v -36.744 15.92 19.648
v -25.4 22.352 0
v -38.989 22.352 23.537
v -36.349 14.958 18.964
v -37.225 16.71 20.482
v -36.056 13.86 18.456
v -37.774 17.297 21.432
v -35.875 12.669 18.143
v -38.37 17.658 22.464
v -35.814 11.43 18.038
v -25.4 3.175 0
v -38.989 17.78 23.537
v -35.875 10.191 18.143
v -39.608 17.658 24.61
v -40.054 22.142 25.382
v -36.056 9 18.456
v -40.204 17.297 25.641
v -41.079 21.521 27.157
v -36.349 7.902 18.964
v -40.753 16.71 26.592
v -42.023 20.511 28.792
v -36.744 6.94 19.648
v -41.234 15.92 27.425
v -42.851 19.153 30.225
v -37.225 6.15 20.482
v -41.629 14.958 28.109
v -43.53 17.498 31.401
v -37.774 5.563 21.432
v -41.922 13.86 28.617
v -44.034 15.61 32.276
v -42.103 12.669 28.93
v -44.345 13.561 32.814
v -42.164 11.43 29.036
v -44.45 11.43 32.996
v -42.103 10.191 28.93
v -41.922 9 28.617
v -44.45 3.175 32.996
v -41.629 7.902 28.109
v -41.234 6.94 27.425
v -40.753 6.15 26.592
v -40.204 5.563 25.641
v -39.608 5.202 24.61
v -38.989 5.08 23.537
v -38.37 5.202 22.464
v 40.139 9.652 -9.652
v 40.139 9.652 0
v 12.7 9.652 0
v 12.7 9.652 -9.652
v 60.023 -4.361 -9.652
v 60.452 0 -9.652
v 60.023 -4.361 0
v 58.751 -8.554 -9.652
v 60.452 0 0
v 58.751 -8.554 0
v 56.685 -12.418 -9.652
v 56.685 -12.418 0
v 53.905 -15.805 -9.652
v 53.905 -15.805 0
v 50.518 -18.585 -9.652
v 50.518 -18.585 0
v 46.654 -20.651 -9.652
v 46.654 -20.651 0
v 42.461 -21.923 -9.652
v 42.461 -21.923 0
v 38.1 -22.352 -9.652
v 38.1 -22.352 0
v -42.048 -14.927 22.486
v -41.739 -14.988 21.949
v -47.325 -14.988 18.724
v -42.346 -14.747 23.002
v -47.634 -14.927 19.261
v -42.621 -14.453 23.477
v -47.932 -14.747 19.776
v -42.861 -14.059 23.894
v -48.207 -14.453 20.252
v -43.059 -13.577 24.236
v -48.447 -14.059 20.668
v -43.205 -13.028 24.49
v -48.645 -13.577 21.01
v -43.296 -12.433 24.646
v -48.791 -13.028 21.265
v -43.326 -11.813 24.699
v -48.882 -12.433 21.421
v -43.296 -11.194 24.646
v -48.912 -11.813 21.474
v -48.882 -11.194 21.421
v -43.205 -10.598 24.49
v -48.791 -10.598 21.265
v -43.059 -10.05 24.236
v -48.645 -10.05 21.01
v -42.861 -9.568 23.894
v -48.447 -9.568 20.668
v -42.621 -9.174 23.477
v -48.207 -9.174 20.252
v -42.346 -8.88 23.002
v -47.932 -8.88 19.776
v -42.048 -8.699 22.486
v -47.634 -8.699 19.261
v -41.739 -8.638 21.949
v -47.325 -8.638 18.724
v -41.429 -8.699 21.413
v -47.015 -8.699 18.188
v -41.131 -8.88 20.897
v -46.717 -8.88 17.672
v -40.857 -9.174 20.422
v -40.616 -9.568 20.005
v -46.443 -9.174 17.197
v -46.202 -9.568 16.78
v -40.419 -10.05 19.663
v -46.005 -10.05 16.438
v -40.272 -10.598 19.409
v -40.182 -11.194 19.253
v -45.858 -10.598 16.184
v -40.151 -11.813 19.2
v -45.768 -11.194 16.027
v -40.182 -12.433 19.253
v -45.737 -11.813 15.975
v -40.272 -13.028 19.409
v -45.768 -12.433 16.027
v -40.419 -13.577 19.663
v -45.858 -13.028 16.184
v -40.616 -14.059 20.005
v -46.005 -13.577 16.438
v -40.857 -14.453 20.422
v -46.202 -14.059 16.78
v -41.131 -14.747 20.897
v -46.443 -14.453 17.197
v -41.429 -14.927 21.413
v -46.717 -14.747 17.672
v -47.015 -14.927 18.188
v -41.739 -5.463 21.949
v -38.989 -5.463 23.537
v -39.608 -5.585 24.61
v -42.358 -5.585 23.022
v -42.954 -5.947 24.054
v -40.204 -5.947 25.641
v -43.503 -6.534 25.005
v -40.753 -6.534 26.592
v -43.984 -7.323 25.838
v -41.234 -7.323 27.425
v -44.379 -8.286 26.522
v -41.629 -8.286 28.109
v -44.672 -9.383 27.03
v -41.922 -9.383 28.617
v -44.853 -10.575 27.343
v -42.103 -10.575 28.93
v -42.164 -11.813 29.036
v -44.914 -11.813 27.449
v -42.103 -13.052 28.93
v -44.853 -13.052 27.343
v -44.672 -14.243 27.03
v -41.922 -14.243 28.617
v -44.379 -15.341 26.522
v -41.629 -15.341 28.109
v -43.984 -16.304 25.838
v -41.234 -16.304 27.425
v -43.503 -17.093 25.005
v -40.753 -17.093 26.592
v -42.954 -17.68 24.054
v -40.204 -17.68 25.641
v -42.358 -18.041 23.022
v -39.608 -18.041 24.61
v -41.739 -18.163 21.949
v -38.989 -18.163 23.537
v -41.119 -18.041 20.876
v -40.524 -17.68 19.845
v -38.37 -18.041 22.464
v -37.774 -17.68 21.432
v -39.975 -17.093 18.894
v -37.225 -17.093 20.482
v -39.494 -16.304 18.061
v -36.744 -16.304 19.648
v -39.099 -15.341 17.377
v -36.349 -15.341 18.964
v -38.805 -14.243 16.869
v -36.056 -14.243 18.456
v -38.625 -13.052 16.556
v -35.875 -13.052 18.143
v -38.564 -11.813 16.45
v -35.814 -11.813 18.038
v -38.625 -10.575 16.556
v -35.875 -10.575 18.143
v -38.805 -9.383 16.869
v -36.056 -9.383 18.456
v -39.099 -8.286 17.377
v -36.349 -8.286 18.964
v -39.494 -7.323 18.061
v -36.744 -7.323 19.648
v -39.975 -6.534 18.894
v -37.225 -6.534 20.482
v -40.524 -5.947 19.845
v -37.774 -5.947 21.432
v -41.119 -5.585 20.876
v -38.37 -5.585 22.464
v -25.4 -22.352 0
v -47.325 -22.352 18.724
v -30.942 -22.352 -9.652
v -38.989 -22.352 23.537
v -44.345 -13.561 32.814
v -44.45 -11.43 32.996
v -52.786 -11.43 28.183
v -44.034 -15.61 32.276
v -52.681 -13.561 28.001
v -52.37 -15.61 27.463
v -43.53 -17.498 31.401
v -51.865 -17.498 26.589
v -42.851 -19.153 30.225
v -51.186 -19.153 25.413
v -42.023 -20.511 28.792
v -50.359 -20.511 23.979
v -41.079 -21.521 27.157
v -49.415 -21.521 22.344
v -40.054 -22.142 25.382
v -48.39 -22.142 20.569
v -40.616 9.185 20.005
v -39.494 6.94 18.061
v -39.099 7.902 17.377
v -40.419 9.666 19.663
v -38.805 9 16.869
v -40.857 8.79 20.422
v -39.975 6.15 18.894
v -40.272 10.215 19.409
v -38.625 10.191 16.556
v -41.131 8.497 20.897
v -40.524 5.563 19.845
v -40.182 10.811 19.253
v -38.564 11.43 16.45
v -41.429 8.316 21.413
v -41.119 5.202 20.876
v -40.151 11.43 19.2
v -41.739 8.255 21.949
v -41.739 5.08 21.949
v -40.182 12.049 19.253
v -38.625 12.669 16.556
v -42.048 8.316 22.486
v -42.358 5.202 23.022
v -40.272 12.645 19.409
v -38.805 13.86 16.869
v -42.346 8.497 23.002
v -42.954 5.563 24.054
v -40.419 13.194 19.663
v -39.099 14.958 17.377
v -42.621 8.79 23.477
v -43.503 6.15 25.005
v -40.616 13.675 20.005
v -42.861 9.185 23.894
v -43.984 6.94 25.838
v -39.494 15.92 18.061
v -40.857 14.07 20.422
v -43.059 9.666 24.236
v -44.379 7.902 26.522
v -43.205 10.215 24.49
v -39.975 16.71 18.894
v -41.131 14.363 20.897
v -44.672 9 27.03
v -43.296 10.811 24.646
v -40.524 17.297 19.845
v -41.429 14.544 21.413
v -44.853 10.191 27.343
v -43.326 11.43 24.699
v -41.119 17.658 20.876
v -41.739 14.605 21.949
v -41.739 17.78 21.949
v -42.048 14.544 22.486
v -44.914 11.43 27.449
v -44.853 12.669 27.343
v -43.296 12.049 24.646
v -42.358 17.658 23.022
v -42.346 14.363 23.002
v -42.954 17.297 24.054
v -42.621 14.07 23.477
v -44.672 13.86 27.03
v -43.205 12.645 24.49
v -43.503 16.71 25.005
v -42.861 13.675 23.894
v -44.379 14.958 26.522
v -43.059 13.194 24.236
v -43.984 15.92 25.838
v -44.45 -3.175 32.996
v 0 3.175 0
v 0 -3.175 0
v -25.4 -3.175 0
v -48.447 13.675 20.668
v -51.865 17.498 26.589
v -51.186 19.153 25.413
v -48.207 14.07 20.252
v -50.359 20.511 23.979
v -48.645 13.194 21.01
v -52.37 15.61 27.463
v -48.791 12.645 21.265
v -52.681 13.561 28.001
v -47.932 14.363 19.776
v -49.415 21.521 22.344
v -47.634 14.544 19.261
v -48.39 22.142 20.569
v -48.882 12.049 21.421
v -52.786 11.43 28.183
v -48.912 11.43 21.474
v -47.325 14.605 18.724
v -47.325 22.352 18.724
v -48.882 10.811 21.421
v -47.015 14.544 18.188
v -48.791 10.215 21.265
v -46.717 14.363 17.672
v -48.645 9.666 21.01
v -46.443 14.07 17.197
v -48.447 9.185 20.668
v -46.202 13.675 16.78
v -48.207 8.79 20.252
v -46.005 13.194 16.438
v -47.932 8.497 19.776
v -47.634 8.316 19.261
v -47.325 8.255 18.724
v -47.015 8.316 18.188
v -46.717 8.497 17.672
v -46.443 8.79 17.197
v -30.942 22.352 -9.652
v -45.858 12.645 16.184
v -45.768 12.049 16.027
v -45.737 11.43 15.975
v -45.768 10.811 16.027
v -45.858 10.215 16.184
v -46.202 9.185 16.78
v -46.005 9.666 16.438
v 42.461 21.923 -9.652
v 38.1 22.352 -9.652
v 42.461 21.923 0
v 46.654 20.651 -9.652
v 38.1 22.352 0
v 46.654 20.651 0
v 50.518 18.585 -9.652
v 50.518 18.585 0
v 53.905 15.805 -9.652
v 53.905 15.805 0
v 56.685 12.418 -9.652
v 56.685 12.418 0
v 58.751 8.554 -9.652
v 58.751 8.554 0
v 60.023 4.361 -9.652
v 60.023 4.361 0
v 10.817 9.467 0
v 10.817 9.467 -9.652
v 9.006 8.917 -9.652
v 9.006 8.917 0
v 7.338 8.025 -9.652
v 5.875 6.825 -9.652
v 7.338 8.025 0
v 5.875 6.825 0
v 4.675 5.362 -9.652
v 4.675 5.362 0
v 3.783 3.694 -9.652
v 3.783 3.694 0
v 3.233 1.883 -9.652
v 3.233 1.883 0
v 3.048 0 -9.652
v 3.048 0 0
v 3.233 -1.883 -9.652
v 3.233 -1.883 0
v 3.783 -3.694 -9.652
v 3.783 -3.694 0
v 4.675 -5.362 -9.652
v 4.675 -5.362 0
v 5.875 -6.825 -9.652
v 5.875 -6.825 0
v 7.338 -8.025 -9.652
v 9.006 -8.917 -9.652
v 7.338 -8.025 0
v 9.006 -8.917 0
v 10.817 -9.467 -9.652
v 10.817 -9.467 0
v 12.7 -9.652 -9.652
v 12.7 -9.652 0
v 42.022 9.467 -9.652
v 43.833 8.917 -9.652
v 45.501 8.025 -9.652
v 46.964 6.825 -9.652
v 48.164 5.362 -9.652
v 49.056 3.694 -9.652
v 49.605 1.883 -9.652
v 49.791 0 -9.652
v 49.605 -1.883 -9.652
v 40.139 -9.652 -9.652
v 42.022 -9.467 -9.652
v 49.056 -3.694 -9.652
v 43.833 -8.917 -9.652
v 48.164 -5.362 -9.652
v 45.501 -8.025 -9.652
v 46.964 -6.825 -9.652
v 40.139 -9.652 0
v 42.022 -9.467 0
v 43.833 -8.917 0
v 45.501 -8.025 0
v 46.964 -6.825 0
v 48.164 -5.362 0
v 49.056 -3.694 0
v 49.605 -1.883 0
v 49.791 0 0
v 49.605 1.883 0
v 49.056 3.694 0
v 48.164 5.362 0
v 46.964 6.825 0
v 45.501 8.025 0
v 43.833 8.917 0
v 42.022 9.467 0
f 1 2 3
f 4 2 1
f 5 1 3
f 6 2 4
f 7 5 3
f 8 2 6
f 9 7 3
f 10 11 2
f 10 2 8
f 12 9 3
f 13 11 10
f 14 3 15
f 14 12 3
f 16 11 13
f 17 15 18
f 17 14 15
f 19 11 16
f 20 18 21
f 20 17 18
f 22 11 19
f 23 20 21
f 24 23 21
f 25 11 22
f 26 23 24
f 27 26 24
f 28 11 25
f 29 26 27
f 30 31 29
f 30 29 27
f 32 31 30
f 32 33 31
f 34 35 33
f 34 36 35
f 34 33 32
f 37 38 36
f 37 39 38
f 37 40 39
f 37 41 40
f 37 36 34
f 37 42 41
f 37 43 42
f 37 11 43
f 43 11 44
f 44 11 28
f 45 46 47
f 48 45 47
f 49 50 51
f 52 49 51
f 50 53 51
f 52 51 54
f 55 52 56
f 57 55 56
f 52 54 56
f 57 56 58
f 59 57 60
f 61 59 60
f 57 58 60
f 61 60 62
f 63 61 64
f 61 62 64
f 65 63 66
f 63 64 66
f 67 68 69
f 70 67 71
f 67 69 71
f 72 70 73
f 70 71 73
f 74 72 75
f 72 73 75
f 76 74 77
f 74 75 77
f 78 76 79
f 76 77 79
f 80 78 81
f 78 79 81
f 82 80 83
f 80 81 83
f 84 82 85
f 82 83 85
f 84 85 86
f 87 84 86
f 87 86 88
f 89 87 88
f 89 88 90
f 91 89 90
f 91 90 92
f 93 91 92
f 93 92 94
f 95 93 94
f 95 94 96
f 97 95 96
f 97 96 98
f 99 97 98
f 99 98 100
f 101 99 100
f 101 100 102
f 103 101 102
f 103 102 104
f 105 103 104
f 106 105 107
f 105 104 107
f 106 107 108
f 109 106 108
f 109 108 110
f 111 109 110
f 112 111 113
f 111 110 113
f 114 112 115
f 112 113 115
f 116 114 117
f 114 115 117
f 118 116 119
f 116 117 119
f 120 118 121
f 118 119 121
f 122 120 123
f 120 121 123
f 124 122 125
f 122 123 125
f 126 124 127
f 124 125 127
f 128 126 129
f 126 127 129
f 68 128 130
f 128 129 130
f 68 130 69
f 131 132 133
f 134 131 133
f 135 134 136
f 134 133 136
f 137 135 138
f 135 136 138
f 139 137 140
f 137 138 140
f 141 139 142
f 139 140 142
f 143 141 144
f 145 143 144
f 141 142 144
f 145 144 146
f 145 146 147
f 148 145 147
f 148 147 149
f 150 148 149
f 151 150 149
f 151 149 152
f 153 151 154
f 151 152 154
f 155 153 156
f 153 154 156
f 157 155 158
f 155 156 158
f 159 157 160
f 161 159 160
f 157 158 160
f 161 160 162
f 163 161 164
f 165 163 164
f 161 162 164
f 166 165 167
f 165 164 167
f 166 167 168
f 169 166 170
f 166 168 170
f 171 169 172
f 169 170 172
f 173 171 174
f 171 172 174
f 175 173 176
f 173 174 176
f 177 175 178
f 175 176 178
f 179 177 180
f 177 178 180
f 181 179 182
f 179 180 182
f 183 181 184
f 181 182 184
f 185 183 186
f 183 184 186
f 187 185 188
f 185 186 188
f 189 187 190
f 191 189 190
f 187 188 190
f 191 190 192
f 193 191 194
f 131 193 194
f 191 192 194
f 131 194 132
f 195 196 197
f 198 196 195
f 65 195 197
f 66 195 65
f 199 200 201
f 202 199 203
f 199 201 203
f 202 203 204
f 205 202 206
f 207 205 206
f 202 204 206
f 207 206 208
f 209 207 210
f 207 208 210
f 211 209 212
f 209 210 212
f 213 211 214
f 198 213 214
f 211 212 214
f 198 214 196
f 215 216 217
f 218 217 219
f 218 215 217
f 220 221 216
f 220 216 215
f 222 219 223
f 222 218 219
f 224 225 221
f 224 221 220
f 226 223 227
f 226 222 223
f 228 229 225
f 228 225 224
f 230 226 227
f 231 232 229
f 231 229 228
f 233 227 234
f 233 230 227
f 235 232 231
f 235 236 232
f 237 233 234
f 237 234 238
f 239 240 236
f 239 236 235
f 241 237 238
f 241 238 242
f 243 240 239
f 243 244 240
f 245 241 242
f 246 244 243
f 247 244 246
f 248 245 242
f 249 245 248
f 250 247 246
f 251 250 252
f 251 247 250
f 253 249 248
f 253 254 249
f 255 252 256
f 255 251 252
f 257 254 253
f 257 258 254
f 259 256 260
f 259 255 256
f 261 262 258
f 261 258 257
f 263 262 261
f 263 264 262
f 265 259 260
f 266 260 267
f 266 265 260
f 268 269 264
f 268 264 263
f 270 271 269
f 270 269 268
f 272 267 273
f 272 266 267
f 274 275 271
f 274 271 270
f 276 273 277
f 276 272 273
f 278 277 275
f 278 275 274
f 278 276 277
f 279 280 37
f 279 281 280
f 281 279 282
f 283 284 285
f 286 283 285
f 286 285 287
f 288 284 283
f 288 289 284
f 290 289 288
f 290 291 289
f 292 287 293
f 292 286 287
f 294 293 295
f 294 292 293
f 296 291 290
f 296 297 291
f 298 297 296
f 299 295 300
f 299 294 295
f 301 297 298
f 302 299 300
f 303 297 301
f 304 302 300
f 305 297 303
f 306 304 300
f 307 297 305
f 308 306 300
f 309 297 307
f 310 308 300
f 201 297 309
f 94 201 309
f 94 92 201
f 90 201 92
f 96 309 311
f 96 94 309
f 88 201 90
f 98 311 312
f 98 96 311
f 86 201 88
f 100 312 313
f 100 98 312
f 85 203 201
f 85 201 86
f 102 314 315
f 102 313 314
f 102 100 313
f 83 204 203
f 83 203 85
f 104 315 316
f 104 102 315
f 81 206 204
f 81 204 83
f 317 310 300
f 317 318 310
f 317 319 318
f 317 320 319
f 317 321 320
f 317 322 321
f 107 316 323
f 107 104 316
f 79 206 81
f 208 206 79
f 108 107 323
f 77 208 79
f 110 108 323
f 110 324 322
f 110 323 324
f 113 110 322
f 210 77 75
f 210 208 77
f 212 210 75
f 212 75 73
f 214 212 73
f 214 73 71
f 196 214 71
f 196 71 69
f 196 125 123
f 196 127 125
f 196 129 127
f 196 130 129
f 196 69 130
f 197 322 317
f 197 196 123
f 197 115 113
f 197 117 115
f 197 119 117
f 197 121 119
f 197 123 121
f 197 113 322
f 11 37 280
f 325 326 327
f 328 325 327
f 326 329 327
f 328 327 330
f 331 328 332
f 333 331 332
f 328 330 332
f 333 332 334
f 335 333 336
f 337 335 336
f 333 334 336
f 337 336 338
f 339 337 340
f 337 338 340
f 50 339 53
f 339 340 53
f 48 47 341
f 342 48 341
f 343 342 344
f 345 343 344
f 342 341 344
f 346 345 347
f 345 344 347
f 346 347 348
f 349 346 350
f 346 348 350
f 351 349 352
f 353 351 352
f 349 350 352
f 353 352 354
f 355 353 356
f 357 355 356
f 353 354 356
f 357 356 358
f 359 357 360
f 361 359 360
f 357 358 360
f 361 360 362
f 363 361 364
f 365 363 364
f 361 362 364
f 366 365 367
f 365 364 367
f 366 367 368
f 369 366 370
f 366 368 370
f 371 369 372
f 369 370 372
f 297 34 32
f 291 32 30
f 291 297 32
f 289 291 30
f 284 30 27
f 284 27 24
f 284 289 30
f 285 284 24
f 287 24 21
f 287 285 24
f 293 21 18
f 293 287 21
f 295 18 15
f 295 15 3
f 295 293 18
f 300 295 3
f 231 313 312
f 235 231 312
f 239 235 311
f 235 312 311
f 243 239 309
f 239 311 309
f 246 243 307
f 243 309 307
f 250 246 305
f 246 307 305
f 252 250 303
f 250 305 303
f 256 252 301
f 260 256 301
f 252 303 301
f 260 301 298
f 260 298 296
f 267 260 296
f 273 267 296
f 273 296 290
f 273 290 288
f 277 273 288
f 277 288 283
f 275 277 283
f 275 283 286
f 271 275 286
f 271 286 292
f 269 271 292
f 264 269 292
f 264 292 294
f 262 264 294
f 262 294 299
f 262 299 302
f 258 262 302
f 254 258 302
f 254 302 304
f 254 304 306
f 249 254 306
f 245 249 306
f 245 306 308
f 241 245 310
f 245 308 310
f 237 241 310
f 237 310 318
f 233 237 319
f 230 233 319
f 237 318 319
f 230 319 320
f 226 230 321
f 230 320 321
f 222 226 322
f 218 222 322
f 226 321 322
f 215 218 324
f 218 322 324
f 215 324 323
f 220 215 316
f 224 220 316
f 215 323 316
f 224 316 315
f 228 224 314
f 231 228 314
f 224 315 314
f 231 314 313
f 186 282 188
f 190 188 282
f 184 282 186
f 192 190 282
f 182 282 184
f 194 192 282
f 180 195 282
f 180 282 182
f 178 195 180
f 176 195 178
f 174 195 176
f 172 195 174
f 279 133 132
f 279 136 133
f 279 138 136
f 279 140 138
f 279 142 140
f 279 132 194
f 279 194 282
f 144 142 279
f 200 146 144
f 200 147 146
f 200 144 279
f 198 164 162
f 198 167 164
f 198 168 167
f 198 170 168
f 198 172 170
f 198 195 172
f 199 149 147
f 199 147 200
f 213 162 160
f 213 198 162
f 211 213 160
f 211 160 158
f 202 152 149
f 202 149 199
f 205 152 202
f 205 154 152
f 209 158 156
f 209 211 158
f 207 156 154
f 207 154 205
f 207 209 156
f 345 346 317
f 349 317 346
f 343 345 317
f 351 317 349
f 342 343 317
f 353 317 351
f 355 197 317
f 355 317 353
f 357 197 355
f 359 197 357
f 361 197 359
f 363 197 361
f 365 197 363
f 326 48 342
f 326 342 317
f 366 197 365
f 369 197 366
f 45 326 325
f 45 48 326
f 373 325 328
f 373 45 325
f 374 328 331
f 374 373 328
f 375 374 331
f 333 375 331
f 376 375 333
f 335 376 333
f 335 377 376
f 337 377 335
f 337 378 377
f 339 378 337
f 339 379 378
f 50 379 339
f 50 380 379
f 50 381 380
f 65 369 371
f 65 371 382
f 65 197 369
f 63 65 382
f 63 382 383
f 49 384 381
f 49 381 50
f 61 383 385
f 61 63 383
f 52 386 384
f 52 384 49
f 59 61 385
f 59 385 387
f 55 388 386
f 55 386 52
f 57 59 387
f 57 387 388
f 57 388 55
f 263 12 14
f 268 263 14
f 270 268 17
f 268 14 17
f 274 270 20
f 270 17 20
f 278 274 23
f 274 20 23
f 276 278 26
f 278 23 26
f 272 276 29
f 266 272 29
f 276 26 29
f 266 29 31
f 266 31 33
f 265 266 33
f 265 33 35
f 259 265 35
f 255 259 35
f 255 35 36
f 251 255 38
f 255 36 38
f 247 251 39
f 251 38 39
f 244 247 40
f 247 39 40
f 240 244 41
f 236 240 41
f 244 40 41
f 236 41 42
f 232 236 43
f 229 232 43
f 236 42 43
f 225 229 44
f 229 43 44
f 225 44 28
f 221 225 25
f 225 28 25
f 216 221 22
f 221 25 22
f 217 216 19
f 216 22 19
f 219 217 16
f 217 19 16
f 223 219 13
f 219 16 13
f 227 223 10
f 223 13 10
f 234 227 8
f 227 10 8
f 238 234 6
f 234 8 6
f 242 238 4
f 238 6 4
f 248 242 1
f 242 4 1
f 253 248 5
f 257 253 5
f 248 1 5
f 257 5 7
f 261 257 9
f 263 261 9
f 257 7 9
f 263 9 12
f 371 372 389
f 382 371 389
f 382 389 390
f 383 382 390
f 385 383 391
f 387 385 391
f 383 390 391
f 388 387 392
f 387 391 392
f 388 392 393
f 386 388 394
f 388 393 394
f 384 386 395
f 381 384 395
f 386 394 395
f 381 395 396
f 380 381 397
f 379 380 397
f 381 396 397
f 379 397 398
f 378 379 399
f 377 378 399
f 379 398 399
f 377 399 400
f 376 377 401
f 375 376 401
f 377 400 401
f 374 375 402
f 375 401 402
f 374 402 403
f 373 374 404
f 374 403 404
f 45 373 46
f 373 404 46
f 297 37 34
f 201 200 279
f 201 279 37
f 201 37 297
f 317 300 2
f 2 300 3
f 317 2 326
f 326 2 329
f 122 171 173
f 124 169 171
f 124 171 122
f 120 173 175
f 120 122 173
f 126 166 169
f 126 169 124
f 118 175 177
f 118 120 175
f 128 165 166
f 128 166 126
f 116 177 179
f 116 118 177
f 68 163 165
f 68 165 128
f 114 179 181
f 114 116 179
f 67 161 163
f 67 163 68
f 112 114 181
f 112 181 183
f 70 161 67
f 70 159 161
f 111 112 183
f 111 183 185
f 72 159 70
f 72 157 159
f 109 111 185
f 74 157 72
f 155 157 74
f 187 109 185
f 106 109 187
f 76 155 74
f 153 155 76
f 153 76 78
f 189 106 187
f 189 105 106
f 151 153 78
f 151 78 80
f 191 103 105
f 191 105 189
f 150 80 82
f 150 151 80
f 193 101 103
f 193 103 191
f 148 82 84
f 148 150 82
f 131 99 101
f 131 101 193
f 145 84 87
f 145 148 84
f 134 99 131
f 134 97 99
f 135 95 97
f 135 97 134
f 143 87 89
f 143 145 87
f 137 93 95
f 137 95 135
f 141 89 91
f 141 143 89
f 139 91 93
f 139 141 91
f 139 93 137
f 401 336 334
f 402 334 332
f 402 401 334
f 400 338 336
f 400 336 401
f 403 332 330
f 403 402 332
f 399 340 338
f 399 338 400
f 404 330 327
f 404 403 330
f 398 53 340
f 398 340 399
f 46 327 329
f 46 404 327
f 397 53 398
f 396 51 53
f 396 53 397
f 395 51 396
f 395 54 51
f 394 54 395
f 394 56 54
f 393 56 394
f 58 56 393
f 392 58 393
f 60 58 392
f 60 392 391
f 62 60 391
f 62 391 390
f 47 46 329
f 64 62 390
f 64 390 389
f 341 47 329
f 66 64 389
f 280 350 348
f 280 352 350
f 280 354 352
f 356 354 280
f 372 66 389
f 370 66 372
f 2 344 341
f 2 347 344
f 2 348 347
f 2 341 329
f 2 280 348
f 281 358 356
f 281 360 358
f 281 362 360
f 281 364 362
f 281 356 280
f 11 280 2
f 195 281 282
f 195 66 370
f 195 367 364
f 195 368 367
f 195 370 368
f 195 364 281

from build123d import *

# Parameters (mm, degrees)
F1_DEPTH = 22.352
F2_DEPTH = 3.175
F4_R     = 22.35199
F5_DEPTH = 25.4
F6_R     = 3.175
F7_DEPTH = 25.4
F8_R     = 6.35
F8_R_2   = 3.175
F9_DEPTH = 3.175
F10_R    = 10.922


# Not quite as in the source:
# - a fillet or chamfer is up to 0.001 mm smaller than in the source, because OpenCascade refuses the exact size


with BuildPart() as f1:
    # F0 (on Front) → F1 (new body, symmetric)
    with BuildSketch(Plane.XZ):
        Polygon((0, 0), (-25.4, 0), (-44.45, 32.9955678842), (-52.7857543947, 28.1829178405), (-30.9417543947, -9.652), (60.452, -9.652), (60.452, 0), align=None)
    extrude(amount=F1_DEPTH, both=True)

    # F0 (on Front) → F2 (join, symmetric)
    with BuildSketch(Plane.XZ):
        Polygon((-44.45, 32.9955678842), (-25.4, 0), (0, 0), align=None)
    extrude(amount=F2_DEPTH, both=True)

    # F4 (radius 22.352 in the source; OpenCascade refuses exactly that, so slightly less here)
    f4_edges = [f1.edges().sort_by_distance(p)[0] for p in [
        (60.452, -22.352, -4.826),
        (60.452, 22.352, -4.826),
    ]]
    fillet(f4_edges, radius=F4_R)

    # F3 (on face) → F5 (cut)
    with BuildSketch(Plane.XY):
        with BuildLine():
            ThreePointArc((12.7, 9.652), (3.048, 0), (12.7, -9.652))
            Line((12.7, -9.652), (40.1388603866, -9.652))
            ThreePointArc((40.1388603866, -9.652), (49.7908603866, 0), (40.1388603866, 9.652))
            Line((40.1388603866, 9.652), (12.7, 9.652))
        make_face()
    extrude(amount=-F5_DEPTH, mode=Mode.SUBTRACT)

    # F6 (on face) → F7 (cut)
    with BuildSketch(Plane(origin=(-27.3857543947, 0, -15.8111726717), x_dir=(0, -1, 0), z_dir=(-0.8660254038, 0, -0.5))):
        with Locations((11.8134439608, 39.878)):
            Circle(F6_R)
        with Locations((-11.43, 39.878)):
            Circle(F6_R)
    extrude(amount=-F7_DEPTH, mode=Mode.SUBTRACT)

    # F8 (on face) → F9 (cut)
    with BuildSketch(Plane(origin=(-19.05, 0, -10.9985226281), x_dir=(0, 1, 0), z_dir=(0.8660254038, 0, 0.5))):
        with Locations((-11.8134439608, 39.878)):
            Circle(F8_R)
        with Locations((-11.8134439608, 39.878)):
            Circle(F8_R_2, mode=Mode.SUBTRACT)
        with Locations((11.43, 39.878)):
            Circle(F8_R)
    extrude(amount=-F9_DEPTH, mode=Mode.SUBTRACT)

    # F10
    f10_edges = [f1.edges().sort_by_distance(p)[0] for p in [
        (-48.617877, -22.352, 30.589243),
        (-48.617877, 22.352, 30.589243),
    ]]
    fillet(f10_edges, radius=F10_R)


solid = f1.part
